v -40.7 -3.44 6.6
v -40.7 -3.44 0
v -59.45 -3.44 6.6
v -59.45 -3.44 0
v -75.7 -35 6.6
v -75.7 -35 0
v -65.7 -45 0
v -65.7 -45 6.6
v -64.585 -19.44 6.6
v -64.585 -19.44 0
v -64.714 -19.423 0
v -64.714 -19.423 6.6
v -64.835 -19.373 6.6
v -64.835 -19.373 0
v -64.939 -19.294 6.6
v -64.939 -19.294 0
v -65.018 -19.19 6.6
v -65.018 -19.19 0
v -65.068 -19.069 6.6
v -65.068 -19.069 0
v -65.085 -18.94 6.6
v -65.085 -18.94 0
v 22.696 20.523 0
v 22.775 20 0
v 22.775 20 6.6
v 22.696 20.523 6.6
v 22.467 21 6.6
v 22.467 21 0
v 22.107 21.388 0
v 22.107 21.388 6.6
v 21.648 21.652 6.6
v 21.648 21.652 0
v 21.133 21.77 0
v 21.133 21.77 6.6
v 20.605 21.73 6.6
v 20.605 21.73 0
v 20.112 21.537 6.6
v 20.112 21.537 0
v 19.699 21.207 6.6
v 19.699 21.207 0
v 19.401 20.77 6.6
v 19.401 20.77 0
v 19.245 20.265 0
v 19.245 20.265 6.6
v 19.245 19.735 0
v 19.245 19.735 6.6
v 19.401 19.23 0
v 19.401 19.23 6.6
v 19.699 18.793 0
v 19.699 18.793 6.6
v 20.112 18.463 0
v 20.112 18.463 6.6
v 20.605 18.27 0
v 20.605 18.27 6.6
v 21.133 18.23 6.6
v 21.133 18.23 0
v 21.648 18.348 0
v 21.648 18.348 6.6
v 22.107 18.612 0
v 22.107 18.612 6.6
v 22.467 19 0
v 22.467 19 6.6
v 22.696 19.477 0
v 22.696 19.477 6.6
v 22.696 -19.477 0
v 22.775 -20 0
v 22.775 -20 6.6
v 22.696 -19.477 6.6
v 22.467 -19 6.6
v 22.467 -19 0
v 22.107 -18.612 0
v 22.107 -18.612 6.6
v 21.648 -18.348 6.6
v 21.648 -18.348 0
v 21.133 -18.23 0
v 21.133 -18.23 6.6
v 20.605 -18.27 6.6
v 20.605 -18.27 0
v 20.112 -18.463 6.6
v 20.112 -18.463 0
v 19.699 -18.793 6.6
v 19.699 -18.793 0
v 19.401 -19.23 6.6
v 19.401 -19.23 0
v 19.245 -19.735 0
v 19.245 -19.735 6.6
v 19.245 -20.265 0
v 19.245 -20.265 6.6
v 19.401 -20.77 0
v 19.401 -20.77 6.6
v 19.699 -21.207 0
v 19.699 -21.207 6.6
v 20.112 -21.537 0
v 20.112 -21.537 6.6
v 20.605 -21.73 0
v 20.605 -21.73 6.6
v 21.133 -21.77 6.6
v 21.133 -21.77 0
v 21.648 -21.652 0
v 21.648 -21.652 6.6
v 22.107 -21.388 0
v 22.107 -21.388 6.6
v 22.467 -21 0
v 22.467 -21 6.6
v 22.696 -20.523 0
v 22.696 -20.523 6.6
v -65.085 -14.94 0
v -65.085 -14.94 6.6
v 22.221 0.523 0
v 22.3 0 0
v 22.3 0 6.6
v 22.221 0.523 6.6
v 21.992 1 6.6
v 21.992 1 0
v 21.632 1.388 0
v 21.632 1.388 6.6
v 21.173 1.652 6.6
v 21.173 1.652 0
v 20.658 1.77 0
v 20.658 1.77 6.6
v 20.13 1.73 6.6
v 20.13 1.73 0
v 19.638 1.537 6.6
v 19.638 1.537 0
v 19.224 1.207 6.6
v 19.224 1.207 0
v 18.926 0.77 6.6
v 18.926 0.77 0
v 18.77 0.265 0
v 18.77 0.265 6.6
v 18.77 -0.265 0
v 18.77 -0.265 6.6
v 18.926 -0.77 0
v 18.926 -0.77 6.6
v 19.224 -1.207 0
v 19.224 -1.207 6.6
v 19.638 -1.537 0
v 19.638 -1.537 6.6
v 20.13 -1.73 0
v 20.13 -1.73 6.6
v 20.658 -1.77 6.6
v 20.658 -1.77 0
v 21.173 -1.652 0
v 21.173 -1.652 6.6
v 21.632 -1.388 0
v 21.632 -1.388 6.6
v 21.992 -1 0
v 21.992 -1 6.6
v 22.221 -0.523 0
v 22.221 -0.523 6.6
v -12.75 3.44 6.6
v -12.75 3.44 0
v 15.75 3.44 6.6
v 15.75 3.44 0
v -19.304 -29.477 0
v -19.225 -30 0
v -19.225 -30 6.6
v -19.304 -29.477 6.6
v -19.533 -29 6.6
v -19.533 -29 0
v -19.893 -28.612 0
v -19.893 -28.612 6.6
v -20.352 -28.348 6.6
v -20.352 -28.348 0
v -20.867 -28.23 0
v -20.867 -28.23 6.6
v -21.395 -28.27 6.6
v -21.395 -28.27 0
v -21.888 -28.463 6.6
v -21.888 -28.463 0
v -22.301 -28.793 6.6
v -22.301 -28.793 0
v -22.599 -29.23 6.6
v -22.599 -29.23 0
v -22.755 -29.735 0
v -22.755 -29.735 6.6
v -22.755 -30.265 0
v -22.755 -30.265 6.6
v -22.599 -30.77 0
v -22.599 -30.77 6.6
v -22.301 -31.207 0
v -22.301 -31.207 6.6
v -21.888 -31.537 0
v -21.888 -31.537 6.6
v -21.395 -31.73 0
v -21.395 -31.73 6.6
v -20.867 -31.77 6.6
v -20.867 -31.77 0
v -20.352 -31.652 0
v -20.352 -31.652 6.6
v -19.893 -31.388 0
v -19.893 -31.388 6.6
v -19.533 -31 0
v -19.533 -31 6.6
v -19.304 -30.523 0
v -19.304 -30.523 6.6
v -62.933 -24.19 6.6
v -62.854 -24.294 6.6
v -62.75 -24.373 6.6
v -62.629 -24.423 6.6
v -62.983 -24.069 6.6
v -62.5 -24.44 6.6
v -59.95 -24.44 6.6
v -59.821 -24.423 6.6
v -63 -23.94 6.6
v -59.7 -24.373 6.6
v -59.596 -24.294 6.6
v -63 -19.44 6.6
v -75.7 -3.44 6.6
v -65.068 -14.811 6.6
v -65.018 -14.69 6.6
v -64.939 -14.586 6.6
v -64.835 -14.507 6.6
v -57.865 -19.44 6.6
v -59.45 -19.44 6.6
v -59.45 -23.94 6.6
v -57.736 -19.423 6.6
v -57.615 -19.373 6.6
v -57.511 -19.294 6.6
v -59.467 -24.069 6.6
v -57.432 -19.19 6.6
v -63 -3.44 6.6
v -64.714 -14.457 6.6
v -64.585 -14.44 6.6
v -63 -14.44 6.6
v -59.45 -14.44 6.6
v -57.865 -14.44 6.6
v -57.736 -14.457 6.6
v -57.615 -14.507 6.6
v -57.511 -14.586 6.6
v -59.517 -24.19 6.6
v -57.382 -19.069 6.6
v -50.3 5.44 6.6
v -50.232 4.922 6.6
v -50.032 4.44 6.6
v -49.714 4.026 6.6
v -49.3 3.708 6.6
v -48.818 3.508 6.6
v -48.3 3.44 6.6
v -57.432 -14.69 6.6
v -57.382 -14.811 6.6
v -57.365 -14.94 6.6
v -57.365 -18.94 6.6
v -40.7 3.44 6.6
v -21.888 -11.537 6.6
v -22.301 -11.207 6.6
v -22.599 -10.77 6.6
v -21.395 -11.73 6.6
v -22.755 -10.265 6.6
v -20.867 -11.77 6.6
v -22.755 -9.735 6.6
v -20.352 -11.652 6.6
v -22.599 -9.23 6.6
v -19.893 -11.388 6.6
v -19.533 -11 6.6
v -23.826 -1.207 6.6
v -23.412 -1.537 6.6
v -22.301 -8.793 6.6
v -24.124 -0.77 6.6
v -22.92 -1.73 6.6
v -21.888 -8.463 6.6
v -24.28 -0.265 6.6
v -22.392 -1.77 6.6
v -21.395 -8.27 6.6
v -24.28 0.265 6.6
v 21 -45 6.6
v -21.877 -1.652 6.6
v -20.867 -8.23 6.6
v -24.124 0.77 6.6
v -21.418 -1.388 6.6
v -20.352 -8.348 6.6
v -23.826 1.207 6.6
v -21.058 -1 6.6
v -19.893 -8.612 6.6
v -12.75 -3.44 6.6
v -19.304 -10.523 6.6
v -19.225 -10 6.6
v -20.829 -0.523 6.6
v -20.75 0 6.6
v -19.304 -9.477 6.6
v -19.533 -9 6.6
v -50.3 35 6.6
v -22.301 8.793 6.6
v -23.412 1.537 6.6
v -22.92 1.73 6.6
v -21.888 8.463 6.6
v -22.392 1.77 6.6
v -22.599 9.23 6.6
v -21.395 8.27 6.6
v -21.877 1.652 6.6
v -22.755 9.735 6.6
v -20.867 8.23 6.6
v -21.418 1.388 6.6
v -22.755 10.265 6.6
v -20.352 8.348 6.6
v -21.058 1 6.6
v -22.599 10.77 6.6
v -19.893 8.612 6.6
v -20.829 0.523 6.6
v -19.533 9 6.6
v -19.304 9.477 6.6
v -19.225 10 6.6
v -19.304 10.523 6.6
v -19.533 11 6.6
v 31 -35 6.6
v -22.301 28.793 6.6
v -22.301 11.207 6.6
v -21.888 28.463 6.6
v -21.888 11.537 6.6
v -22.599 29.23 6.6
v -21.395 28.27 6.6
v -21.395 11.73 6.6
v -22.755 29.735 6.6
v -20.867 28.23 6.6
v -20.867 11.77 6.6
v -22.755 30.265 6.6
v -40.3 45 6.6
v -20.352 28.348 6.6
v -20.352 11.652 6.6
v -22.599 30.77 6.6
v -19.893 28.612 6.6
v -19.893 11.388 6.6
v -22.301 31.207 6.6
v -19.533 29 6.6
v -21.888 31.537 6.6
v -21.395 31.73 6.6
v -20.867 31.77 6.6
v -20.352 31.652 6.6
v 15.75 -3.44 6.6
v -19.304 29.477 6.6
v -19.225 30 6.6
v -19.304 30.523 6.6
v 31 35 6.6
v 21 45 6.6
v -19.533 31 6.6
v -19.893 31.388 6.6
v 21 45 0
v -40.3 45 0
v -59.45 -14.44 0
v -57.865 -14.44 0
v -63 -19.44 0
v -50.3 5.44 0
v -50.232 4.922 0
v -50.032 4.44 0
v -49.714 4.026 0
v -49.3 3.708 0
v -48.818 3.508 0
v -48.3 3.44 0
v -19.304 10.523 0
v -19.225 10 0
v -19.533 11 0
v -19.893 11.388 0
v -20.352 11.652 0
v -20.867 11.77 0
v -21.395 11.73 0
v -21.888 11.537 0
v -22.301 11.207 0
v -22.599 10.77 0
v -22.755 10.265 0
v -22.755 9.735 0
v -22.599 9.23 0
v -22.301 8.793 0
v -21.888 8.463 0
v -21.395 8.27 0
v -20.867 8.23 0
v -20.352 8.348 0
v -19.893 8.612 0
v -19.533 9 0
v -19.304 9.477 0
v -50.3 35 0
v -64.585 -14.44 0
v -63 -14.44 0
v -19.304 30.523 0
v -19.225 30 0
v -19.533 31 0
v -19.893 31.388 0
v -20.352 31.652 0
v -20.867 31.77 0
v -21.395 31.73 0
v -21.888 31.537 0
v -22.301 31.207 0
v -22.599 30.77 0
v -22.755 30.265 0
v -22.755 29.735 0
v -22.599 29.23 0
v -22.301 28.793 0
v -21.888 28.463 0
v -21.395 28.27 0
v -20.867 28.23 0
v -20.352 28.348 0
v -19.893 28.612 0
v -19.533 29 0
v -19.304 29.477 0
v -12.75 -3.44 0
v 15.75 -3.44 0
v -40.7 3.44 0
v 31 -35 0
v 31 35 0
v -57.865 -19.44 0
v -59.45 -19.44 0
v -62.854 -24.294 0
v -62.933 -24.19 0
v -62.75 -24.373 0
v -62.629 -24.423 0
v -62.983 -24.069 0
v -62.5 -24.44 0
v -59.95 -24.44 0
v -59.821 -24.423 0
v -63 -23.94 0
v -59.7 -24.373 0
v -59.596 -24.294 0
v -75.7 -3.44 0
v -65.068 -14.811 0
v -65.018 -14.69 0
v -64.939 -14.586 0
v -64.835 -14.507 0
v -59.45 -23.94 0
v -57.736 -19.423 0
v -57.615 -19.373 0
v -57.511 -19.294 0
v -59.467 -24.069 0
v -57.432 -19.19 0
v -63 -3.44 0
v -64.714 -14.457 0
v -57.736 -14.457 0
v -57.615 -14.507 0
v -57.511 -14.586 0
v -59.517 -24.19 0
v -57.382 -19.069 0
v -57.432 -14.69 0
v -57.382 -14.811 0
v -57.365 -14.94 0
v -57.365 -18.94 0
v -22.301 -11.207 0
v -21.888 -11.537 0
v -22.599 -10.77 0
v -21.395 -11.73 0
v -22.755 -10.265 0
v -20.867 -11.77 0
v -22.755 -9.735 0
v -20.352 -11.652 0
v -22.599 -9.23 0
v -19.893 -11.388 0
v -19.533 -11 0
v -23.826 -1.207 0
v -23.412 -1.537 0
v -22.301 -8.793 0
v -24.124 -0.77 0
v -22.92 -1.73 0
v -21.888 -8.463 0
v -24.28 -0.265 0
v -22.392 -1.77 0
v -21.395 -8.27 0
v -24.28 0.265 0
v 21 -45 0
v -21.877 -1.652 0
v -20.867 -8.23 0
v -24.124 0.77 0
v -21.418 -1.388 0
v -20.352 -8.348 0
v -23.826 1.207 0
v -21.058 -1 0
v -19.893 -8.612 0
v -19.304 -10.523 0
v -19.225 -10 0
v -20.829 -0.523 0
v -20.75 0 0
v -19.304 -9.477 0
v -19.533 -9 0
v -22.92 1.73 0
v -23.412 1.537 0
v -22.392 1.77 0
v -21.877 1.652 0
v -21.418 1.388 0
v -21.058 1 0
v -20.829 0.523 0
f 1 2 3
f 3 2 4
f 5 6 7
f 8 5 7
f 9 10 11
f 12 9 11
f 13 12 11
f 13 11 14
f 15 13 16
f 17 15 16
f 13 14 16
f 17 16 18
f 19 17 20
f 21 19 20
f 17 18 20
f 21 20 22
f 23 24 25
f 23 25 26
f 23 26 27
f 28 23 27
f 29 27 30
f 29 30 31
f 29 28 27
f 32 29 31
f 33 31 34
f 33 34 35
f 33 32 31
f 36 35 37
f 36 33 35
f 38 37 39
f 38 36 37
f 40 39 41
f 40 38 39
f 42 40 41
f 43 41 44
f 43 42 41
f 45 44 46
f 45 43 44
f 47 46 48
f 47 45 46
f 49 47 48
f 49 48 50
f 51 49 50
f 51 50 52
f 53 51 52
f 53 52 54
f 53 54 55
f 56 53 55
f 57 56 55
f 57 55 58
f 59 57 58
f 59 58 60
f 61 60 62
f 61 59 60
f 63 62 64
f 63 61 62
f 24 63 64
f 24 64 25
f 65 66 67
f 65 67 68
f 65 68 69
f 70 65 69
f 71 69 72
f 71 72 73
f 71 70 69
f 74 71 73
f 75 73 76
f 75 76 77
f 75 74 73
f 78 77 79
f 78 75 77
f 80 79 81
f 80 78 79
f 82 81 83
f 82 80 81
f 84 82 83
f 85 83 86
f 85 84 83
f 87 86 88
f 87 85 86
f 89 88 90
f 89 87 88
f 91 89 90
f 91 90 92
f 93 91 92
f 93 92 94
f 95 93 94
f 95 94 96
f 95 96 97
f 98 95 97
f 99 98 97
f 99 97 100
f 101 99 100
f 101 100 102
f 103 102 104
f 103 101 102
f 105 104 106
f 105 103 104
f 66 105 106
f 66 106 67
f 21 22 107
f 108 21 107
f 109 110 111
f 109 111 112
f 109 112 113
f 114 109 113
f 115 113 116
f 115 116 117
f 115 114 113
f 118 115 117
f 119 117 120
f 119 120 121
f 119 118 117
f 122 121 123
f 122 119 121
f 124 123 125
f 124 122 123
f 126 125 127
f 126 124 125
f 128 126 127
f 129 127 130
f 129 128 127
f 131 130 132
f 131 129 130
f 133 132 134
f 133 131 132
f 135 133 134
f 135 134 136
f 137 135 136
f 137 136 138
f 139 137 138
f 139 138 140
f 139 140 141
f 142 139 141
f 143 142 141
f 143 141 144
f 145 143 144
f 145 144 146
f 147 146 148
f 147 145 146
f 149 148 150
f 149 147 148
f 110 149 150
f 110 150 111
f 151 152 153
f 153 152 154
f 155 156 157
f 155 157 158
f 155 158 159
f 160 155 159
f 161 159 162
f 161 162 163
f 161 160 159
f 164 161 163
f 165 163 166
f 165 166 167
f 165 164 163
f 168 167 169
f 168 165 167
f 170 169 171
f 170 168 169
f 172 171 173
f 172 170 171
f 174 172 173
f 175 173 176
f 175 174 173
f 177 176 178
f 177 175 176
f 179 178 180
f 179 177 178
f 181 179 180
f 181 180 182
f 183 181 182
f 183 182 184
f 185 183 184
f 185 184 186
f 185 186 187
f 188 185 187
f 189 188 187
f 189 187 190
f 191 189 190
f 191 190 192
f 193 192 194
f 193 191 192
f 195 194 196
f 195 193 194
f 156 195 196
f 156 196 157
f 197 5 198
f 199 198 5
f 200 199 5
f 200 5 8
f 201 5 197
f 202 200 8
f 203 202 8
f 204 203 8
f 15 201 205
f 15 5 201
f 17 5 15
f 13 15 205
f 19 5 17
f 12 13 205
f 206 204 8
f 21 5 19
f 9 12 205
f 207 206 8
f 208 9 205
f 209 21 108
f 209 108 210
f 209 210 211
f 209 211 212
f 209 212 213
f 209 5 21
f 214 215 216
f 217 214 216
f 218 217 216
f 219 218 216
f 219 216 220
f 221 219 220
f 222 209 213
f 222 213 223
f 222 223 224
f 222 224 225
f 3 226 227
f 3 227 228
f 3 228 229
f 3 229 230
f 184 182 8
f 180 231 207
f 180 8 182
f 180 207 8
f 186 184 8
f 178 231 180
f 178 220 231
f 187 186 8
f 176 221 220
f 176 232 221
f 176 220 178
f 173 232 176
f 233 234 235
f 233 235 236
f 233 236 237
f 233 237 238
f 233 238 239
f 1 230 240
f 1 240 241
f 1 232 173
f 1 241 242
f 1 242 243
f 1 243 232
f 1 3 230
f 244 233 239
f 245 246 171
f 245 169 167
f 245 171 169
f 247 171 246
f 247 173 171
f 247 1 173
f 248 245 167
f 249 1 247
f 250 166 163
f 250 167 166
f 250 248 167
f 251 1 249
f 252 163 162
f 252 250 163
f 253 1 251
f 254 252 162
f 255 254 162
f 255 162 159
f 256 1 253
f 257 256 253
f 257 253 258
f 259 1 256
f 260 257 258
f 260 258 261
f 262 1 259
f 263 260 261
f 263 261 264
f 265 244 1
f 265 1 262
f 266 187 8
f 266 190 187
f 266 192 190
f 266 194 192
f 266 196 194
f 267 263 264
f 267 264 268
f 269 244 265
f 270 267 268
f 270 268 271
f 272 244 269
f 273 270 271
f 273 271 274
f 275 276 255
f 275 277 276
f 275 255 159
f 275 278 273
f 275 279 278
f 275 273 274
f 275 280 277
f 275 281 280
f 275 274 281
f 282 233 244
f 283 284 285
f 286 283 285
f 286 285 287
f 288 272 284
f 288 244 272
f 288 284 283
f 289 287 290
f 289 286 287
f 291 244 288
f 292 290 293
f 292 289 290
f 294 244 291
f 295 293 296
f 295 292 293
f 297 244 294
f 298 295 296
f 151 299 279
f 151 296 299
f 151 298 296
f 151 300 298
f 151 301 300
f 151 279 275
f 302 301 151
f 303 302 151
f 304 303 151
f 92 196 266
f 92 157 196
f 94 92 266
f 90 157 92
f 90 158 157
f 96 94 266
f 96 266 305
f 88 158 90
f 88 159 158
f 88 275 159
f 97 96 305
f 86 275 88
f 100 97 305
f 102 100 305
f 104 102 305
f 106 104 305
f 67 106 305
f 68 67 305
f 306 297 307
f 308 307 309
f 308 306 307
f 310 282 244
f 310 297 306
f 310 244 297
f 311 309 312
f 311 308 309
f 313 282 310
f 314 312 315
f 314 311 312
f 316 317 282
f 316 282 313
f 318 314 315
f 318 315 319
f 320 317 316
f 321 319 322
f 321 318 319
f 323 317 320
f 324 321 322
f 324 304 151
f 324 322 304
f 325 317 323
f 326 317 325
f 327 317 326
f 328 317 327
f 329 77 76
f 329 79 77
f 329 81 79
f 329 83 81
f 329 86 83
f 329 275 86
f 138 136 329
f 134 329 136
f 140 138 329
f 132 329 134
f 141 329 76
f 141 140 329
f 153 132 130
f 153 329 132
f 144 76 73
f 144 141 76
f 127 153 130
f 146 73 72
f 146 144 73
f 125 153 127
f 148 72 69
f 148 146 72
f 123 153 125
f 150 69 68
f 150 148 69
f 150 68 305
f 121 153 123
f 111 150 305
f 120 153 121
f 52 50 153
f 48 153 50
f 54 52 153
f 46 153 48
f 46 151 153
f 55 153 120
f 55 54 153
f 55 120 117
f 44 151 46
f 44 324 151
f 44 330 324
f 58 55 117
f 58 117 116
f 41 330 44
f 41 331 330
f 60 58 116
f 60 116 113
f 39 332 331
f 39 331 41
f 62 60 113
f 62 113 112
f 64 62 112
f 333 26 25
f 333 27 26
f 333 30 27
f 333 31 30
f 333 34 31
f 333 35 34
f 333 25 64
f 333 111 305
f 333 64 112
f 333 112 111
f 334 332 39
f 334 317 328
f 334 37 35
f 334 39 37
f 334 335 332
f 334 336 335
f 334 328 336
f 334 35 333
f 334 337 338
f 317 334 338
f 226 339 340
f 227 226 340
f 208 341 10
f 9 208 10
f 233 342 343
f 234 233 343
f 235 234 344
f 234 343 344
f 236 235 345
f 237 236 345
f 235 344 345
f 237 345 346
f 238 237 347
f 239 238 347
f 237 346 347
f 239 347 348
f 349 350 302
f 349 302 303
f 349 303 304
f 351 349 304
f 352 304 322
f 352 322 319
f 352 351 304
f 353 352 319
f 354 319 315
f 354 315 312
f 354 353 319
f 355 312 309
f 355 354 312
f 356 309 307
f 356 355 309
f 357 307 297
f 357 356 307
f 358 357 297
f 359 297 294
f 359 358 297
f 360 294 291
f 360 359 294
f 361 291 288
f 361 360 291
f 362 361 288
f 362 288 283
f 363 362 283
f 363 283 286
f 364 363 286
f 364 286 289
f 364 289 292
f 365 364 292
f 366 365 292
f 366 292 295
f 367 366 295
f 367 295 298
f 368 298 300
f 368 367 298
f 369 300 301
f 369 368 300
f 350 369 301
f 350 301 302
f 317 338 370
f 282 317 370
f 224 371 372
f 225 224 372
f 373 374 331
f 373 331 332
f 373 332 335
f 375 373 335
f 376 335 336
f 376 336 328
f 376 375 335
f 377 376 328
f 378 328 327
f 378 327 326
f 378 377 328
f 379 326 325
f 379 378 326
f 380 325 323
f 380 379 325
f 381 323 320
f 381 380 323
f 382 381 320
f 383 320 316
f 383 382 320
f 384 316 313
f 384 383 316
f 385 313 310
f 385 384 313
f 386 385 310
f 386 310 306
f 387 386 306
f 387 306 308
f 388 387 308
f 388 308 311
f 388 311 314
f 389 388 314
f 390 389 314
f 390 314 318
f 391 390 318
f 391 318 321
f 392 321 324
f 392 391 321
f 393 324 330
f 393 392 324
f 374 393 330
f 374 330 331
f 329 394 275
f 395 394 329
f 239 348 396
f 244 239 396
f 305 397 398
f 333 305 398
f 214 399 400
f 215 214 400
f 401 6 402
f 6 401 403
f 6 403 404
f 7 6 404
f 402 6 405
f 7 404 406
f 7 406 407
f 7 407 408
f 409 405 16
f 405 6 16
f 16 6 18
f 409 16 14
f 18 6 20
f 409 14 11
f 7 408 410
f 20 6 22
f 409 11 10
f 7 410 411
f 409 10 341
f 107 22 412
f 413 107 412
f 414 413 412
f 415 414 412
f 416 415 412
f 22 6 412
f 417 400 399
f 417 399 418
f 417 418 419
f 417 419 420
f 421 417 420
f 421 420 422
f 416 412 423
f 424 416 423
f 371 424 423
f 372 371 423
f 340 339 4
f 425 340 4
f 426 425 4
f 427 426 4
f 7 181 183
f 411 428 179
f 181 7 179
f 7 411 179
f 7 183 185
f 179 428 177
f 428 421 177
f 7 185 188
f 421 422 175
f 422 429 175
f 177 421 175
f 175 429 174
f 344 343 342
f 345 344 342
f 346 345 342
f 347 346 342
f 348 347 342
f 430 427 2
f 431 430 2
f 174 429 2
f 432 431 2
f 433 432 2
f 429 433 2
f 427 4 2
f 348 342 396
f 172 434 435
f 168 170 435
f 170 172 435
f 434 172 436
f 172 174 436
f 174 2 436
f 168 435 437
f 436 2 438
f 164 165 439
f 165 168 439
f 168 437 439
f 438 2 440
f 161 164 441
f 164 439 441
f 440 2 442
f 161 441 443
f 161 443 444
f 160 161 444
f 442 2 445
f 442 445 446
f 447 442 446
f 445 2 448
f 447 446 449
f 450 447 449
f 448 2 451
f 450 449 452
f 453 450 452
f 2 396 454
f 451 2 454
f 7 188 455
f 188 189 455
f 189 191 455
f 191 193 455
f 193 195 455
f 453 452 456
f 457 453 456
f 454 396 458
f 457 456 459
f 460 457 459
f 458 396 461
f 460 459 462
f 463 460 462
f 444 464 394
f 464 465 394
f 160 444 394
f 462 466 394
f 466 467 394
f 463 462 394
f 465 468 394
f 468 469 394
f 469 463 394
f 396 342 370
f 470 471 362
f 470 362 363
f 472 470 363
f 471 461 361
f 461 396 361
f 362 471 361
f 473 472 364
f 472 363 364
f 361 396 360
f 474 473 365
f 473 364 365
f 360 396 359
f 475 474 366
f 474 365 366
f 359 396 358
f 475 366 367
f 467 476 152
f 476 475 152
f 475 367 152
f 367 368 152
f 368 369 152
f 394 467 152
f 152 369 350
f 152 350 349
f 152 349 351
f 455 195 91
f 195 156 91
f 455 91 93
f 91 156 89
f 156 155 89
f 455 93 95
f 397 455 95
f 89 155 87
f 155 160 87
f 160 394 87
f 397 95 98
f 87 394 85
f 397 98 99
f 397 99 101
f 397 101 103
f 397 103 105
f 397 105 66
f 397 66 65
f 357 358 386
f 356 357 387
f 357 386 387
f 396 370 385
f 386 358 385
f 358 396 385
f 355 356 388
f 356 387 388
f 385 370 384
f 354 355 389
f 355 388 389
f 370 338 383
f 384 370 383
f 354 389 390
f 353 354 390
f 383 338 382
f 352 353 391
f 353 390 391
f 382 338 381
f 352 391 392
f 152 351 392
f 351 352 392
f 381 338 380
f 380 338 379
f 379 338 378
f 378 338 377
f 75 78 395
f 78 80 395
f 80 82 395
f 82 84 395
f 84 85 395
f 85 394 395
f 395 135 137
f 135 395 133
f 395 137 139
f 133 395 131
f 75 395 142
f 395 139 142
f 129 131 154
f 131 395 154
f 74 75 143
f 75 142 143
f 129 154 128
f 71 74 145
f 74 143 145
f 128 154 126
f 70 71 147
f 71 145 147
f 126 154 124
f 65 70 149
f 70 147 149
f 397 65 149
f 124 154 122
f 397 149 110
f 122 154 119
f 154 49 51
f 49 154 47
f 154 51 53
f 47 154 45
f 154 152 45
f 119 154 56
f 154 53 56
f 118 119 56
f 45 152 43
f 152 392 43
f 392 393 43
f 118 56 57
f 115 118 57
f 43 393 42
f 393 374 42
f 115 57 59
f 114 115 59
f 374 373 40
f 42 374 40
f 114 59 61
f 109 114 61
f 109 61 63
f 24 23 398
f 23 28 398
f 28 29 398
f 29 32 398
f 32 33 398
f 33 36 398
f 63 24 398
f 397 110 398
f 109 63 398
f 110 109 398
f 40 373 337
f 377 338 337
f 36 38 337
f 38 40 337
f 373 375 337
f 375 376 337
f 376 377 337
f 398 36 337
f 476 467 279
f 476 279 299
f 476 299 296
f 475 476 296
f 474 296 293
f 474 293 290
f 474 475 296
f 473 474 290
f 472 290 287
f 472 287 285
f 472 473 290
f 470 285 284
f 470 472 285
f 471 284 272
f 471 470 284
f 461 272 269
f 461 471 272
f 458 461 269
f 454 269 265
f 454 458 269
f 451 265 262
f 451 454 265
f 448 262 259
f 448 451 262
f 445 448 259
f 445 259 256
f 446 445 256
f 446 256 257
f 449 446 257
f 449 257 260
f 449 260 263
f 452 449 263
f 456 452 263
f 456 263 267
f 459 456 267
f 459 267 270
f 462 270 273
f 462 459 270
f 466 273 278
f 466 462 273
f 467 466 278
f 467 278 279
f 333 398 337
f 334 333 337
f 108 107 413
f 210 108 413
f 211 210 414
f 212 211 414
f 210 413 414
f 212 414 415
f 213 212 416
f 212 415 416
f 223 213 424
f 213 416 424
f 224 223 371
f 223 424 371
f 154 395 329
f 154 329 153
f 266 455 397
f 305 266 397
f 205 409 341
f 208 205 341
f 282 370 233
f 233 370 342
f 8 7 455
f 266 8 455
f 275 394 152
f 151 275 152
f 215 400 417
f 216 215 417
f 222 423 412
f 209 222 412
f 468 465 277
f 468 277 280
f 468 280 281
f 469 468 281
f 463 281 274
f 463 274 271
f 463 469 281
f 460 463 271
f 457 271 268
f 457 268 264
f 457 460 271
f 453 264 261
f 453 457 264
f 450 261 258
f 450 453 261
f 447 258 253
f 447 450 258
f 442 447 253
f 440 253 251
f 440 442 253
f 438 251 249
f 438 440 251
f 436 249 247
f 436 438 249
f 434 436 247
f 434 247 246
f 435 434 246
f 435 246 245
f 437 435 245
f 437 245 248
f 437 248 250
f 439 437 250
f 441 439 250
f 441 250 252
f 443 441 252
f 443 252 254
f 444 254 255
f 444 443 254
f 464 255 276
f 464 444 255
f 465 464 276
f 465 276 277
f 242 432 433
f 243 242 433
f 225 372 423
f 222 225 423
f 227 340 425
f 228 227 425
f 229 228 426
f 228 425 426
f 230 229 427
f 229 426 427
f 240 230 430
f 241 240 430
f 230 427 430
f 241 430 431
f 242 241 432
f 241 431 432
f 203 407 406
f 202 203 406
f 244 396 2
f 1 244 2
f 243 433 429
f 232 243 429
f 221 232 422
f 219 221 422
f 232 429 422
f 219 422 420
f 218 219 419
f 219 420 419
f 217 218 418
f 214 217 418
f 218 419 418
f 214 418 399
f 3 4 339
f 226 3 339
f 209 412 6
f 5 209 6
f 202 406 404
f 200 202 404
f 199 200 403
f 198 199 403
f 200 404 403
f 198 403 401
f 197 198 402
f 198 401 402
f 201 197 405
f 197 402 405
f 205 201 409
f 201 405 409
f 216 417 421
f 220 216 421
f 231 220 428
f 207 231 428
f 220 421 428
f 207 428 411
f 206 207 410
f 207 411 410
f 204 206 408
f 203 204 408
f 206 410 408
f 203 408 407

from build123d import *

# Parameters (mm, degrees)
MODEL_R             = 1.775
MODEL_W             = 28.5
MODEL_H             = 6.88
BOSS_EXTRUDE1_DEPTH = 6.6


with BuildPart() as part:
    # Model → Boss-Extrude1 (new body)
    with BuildSketch(Plane.XY):
        with BuildLine():
            Line((-40.3, 45), (-50.3, 35))
            Line((-50.3, 35), (-50.3, 5.44))
            ThreePointArc((-50.3, 5.44), (-49.714213562, 4.025786438), (-48.3, 3.44))
            Line((-48.3, 3.44), (-40.7, 3.44))
            Line((-40.7, 3.44), (-40.7, -3.44))
            Line((-40.7, -3.44), (-59.45, -3.44))
            Line((-59.45, -3.44), (-59.45, -14.44))
            Line((-59.45, -14.44), (-57.865, -14.44))
            ThreePointArc((-57.865, -14.44), (-57.511446609, -14.586446609), (-57.365, -14.94))
            Line((-57.365, -14.94), (-57.365, -18.94))
            ThreePointArc((-57.365, -18.94), (-57.511446609, -19.293553391), (-57.865, -19.44))
            Line((-57.865, -19.44), (-59.45, -19.44))
            Line((-59.45, -19.44), (-59.45, -23.94))
            ThreePointArc((-59.45, -23.94), (-59.596446609, -24.293553391), (-59.95, -24.44))
            Line((-59.95, -24.44), (-62.5, -24.44))
            ThreePointArc((-62.5, -24.44), (-62.853553391, -24.293553391), (-63, -23.94))
            Line((-63, -23.94), (-63, -19.44))
            Line((-63, -19.44), (-64.585, -19.44))
            ThreePointArc((-64.585, -19.44), (-64.938553391, -19.293553391), (-65.085, -18.94))
            Line((-65.085, -18.94), (-65.085, -14.94))
            ThreePointArc((-65.085, -14.94), (-64.938553391, -14.586446609), (-64.585, -14.44))
            Line((-64.585, -14.44), (-63, -14.44))
            Line((-63, -14.44), (-63, -3.44))
            Line((-63, -3.44), (-75.7, -3.44))
            Line((-75.7, -3.44), (-75.7, -35))
            Line((-75.7, -35), (-65.7, -45))
            Line((-65.7, -45), (21, -45))
            Line((21, -45), (31, -35))
            Line((31, -35), (31, 35))
            Line((31, 35), (21, 45))
            Line((21, 45), (-40.3, 45))
        make_face()
        with Locations((-21, 30)):
            Circle(MODEL_R, mode=Mode.SUBTRACT)
        with Locations((-21, 10)):
            Circle(MODEL_R, mode=Mode.SUBTRACT)
        with Locations((-21, -10)):
            Circle(MODEL_R, mode=Mode.SUBTRACT)
        with Locations((-21, -30)):
            Circle(MODEL_R, mode=Mode.SUBTRACT)
        with Locations((21, 20)):
            Circle(MODEL_R, mode=Mode.SUBTRACT)
        with Locations((21, -20)):
            Circle(MODEL_R, mode=Mode.SUBTRACT)
        with Locations((-22.524993759, 0)):
            Circle(MODEL_R, mode=Mode.SUBTRACT)
        with Locations((20.525006241, 0)):
            Circle(MODEL_R, mode=Mode.SUBTRACT)
        with Locations((1.500006241, 0)):
            Rectangle(MODEL_W, MODEL_H, mode=Mode.SUBTRACT)
    extrude(amount=BOSS_EXTRUDE1_DEPTH)


solid = part.part
